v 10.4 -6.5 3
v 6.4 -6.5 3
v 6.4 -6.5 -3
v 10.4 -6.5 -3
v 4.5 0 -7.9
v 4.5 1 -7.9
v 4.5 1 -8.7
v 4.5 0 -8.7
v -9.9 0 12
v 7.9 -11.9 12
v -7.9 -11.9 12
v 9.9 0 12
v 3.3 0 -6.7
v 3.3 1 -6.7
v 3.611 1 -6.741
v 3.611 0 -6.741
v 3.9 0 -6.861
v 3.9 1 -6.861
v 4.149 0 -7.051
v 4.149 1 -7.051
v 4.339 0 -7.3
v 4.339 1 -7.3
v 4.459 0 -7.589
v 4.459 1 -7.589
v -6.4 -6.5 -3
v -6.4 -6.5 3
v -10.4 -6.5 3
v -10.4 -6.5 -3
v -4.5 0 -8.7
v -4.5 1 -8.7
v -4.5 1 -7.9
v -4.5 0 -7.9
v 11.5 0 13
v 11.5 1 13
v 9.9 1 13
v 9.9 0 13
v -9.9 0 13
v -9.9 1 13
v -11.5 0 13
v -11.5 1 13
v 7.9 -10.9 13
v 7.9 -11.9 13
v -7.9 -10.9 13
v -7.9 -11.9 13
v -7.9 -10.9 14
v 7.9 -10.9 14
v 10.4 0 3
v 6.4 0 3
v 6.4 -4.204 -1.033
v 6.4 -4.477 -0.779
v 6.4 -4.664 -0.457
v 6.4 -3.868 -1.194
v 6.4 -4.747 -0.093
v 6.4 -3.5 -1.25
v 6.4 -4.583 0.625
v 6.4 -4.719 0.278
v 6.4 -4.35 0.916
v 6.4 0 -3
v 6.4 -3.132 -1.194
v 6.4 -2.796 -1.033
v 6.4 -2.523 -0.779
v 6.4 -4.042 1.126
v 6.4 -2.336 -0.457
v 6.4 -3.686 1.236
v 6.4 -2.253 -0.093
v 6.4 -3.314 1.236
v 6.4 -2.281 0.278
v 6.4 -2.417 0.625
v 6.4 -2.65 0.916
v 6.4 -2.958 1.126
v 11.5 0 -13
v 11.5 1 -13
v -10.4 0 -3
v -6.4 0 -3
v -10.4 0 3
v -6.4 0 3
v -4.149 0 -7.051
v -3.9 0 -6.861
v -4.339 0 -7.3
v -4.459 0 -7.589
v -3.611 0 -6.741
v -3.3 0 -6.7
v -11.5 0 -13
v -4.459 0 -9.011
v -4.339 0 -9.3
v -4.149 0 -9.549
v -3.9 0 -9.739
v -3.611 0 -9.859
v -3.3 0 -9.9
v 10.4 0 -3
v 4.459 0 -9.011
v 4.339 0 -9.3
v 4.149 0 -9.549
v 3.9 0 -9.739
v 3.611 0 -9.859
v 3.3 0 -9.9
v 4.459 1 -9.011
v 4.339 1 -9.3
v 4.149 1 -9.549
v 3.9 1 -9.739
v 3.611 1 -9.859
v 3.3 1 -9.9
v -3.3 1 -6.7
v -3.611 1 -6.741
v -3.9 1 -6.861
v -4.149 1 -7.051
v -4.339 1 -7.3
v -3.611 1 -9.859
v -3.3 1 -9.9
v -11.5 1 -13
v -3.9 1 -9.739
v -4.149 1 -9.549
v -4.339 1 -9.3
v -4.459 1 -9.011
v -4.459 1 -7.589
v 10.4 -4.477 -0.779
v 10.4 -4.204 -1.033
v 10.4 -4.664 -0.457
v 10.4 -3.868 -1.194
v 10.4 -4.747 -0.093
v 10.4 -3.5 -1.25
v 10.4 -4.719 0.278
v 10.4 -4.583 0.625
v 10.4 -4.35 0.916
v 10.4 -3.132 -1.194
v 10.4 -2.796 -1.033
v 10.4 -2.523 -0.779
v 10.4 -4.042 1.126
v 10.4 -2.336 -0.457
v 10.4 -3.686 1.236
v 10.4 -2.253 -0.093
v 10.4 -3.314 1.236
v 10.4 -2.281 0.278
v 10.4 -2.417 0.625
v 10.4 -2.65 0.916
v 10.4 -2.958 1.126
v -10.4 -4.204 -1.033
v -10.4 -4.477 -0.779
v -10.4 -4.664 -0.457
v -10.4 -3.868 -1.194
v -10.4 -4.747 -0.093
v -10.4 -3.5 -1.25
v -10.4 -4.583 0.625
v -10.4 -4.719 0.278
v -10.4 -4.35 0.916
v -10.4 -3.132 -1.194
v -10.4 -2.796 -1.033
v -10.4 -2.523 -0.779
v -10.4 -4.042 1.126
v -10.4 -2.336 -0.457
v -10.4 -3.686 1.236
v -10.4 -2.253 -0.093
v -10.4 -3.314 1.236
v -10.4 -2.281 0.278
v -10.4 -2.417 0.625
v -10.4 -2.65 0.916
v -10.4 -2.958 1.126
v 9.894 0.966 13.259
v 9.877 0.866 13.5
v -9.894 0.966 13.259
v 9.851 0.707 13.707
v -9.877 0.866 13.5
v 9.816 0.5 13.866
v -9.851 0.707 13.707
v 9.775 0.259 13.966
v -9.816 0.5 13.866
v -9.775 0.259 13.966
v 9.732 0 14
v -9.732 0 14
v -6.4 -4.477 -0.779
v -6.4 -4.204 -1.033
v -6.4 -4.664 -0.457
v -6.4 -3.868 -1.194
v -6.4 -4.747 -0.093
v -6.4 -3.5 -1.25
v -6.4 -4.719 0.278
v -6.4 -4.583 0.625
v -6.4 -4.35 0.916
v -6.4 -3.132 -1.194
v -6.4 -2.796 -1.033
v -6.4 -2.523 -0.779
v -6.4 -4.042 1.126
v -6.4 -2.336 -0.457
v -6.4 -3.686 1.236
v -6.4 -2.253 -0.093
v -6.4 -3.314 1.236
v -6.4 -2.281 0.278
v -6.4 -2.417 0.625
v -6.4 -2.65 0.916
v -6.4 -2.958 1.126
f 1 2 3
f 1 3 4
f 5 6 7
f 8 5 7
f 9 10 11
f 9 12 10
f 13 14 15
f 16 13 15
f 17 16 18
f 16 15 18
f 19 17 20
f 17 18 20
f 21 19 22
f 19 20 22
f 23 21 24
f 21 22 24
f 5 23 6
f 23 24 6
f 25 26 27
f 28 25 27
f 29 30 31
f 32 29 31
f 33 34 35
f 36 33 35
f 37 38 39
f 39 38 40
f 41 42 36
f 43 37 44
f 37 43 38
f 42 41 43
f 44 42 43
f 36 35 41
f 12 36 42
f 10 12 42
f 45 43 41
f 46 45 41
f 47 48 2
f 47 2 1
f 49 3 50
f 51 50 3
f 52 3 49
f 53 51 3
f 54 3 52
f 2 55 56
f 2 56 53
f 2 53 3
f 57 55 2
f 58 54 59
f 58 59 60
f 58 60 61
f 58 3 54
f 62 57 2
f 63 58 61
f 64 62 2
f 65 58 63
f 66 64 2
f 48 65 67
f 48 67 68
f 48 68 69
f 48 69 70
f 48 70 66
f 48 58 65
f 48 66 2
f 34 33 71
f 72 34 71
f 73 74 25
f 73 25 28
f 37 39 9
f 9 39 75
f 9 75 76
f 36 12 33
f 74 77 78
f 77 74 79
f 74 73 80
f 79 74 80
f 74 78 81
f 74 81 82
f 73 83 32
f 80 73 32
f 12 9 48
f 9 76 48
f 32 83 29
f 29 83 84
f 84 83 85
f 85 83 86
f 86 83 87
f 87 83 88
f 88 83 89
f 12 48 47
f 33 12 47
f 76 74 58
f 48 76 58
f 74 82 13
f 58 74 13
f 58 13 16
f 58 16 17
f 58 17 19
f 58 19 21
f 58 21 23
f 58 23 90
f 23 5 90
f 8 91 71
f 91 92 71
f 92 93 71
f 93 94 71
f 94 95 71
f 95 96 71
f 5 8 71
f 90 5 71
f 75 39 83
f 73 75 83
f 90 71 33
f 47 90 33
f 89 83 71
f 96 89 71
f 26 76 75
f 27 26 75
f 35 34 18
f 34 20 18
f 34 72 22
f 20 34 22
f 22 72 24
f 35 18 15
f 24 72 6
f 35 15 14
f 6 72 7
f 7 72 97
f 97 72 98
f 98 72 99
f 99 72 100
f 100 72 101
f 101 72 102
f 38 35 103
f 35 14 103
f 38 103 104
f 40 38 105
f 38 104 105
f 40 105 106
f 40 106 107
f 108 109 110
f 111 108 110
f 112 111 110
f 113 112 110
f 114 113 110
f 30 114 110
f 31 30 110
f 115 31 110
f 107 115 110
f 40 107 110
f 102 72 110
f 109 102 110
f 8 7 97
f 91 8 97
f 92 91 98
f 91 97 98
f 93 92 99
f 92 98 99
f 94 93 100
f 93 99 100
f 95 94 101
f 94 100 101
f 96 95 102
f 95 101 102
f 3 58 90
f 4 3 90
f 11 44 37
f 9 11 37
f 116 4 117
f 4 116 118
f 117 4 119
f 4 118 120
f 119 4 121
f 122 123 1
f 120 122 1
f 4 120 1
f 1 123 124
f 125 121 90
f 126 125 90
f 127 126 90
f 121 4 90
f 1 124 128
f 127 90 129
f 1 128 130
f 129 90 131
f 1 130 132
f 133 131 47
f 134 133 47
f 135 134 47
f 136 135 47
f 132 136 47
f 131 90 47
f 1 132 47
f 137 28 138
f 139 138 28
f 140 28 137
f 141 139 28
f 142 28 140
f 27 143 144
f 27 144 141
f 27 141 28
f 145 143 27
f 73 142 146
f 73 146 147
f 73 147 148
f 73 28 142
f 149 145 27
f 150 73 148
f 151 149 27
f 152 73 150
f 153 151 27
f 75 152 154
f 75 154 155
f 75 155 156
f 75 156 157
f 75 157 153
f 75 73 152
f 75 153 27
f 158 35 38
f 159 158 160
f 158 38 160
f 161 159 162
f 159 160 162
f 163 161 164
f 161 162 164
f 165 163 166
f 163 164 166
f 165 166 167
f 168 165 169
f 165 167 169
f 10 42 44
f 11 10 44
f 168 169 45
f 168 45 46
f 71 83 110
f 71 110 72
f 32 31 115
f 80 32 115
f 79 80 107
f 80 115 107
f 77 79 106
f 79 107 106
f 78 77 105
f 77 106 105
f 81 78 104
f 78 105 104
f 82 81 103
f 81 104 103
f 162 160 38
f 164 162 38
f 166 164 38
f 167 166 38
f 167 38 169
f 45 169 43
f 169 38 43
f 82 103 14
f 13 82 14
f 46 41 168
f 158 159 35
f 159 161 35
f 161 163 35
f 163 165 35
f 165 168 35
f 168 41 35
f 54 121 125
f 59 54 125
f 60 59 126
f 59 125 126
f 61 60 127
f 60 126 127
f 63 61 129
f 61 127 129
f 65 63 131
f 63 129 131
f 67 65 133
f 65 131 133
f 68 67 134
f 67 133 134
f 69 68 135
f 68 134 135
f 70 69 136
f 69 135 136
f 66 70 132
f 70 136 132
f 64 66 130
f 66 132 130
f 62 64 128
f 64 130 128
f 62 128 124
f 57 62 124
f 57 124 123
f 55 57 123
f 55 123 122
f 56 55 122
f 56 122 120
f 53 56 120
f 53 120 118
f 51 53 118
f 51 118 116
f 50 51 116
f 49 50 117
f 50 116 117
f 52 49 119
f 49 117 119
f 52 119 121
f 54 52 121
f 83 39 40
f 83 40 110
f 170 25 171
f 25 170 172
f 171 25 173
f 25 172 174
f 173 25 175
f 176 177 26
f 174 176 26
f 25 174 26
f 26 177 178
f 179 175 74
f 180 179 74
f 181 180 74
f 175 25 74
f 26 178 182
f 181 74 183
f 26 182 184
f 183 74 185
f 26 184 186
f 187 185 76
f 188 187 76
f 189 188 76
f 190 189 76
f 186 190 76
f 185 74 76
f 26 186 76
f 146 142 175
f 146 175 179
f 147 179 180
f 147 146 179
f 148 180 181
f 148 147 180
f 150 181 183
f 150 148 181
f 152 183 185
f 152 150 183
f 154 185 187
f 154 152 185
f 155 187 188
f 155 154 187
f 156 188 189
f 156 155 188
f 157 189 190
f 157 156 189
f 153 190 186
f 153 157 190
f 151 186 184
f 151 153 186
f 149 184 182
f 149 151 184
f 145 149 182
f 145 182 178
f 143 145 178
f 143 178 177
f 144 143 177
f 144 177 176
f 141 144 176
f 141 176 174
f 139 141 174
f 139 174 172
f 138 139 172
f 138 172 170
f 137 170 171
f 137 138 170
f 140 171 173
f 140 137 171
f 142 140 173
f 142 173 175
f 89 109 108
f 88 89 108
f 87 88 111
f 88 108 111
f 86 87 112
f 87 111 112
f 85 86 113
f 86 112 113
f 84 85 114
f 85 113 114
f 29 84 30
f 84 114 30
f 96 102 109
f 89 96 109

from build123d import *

# Parameters (mm, degrees)
SKIZZE1_W                       = 23
SKIZZE1_H                       = 26
AUFSATZ_LINEAR_AUSTRAGEN1_DEPTH = 1
SKIZZE2_W                       = 4
SKIZZE2_H                       = 6
AUFSATZ_LINEAR_AUSTRAGEN2_DEPTH = 6.5
SKIZZE3_R                       = 1.25
SCHNITT_LINEAR_AUSTRAGEN1_DEPTH = 4
AUFSATZ_LINEAR_AUSTRAGEN3_DEPTH = 1
AUFSATZ_LINEAR_AUSTRAGEN4_DEPTH = 1
SCHNITT_LINEAR_AUSTRAGEN2_DEPTH = 1
VERRUNDUNG1_R                   = 1


with BuildPart() as part:
    # Skizze1 → Aufsatz-Linear austragen1 (new body)
    with BuildSketch(Plane(origin=(0, 0, 0), x_dir=(1, 0, 0), z_dir=(0, 1, 0))):
        Rectangle(SKIZZE1_W, SKIZZE1_H)
    extrude(amount=AUFSATZ_LINEAR_AUSTRAGEN1_DEPTH)

    # Skizze2 → Aufsatz-Linear austragen2 (add)
    with BuildSketch(Plane.XZ):
        with Locations((8.4, 0)):
            Rectangle(SKIZZE2_W, SKIZZE2_H)
    aufsatz_linear_austragen2 = extrude(amount=AUFSATZ_LINEAR_AUSTRAGEN2_DEPTH)

    # Skizze3 → Schnitt-Linear austragen1 (cut)
    with BuildSketch(Plane(origin=(10.4, 0, 0), x_dir=(0, 0, -1), z_dir=(1, 0, 0))):
        with Locations((0, -3.5)):
            Circle(SKIZZE3_R)
    schnitt_linear_austragen1 = extrude(amount=-SCHNITT_LINEAR_AUSTRAGEN1_DEPTH, mode=Mode.SUBTRACT)

    # Spiegeln1: Aufsatz-Linear austragen2, Schnitt-Linear austragen1 across plane
    add(aufsatz_linear_austragen2.mirror(Plane(origin=(0, 0, 0), x_dir=(0, 0, 1), z_dir=(1, 0, 0))))
    add(schnitt_linear_austragen1.mirror(Plane(origin=(0, 0, 0), x_dir=(0, 0, 1), z_dir=(1, 0, 0))), mode=Mode.SUBTRACT)

    # Skizze4 → Aufsatz-Linear austragen3 (add)
    with BuildSketch(Plane.XY.offset(13)):
        Polygon((9.9, 1), (-9.9, 1), (-7.9, -10.9), (7.9, -10.9), align=None)
    extrude(amount=AUFSATZ_LINEAR_AUSTRAGEN3_DEPTH)

    # Skizze5 → Aufsatz-Linear austragen4 (add)
    with BuildSketch(Plane(origin=(0, 0, 13), x_dir=(-1, 0, 0), z_dir=(0, 0, -1))):
        Polygon((-7.9, -11.9), (7.9, -11.9), (9.9, 0), (-9.9, 0), align=None)
    extrude(amount=AUFSATZ_LINEAR_AUSTRAGEN4_DEPTH)

    # Skizze6 → Schnitt-Linear austragen2 (cut)
    with BuildSketch(Plane(origin=(0, 1, 0), x_dir=(1, 0, 0), z_dir=(0, 1, 0))):
        with BuildLine():
            Line((3.3, 9.9), (-3.3, 9.9))
            ThreePointArc((-3.3, 9.9), (-4.148528137, 9.548528137), (-4.5, 8.7))
            Line((-4.5, 8.7), (-4.5, 7.9))
            ThreePointArc((-4.5, 7.9), (-4.148528137, 7.051471863), (-3.3, 6.7))
            Line((-3.3, 6.7), (3.3, 6.7))
            ThreePointArc((3.3, 6.7), (4.148528137, 7.051471863), (4.5, 7.9))
            Line((4.5, 7.9), (4.5, 8.7))
            ThreePointArc((4.5, 8.7), (4.148528137, 9.548528137), (3.3, 9.9))
        make_face()
    extrude(amount=-SCHNITT_LINEAR_AUSTRAGEN2_DEPTH, mode=Mode.SUBTRACT)

    # Verrundung1
    verrundung1_edges = [part.edges().sort_by_distance(p)[0] for p in [
        (0, 1, 14),
    ]]
    fillet(verrundung1_edges, radius=VERRUNDUNG1_R)


solid = part.part
